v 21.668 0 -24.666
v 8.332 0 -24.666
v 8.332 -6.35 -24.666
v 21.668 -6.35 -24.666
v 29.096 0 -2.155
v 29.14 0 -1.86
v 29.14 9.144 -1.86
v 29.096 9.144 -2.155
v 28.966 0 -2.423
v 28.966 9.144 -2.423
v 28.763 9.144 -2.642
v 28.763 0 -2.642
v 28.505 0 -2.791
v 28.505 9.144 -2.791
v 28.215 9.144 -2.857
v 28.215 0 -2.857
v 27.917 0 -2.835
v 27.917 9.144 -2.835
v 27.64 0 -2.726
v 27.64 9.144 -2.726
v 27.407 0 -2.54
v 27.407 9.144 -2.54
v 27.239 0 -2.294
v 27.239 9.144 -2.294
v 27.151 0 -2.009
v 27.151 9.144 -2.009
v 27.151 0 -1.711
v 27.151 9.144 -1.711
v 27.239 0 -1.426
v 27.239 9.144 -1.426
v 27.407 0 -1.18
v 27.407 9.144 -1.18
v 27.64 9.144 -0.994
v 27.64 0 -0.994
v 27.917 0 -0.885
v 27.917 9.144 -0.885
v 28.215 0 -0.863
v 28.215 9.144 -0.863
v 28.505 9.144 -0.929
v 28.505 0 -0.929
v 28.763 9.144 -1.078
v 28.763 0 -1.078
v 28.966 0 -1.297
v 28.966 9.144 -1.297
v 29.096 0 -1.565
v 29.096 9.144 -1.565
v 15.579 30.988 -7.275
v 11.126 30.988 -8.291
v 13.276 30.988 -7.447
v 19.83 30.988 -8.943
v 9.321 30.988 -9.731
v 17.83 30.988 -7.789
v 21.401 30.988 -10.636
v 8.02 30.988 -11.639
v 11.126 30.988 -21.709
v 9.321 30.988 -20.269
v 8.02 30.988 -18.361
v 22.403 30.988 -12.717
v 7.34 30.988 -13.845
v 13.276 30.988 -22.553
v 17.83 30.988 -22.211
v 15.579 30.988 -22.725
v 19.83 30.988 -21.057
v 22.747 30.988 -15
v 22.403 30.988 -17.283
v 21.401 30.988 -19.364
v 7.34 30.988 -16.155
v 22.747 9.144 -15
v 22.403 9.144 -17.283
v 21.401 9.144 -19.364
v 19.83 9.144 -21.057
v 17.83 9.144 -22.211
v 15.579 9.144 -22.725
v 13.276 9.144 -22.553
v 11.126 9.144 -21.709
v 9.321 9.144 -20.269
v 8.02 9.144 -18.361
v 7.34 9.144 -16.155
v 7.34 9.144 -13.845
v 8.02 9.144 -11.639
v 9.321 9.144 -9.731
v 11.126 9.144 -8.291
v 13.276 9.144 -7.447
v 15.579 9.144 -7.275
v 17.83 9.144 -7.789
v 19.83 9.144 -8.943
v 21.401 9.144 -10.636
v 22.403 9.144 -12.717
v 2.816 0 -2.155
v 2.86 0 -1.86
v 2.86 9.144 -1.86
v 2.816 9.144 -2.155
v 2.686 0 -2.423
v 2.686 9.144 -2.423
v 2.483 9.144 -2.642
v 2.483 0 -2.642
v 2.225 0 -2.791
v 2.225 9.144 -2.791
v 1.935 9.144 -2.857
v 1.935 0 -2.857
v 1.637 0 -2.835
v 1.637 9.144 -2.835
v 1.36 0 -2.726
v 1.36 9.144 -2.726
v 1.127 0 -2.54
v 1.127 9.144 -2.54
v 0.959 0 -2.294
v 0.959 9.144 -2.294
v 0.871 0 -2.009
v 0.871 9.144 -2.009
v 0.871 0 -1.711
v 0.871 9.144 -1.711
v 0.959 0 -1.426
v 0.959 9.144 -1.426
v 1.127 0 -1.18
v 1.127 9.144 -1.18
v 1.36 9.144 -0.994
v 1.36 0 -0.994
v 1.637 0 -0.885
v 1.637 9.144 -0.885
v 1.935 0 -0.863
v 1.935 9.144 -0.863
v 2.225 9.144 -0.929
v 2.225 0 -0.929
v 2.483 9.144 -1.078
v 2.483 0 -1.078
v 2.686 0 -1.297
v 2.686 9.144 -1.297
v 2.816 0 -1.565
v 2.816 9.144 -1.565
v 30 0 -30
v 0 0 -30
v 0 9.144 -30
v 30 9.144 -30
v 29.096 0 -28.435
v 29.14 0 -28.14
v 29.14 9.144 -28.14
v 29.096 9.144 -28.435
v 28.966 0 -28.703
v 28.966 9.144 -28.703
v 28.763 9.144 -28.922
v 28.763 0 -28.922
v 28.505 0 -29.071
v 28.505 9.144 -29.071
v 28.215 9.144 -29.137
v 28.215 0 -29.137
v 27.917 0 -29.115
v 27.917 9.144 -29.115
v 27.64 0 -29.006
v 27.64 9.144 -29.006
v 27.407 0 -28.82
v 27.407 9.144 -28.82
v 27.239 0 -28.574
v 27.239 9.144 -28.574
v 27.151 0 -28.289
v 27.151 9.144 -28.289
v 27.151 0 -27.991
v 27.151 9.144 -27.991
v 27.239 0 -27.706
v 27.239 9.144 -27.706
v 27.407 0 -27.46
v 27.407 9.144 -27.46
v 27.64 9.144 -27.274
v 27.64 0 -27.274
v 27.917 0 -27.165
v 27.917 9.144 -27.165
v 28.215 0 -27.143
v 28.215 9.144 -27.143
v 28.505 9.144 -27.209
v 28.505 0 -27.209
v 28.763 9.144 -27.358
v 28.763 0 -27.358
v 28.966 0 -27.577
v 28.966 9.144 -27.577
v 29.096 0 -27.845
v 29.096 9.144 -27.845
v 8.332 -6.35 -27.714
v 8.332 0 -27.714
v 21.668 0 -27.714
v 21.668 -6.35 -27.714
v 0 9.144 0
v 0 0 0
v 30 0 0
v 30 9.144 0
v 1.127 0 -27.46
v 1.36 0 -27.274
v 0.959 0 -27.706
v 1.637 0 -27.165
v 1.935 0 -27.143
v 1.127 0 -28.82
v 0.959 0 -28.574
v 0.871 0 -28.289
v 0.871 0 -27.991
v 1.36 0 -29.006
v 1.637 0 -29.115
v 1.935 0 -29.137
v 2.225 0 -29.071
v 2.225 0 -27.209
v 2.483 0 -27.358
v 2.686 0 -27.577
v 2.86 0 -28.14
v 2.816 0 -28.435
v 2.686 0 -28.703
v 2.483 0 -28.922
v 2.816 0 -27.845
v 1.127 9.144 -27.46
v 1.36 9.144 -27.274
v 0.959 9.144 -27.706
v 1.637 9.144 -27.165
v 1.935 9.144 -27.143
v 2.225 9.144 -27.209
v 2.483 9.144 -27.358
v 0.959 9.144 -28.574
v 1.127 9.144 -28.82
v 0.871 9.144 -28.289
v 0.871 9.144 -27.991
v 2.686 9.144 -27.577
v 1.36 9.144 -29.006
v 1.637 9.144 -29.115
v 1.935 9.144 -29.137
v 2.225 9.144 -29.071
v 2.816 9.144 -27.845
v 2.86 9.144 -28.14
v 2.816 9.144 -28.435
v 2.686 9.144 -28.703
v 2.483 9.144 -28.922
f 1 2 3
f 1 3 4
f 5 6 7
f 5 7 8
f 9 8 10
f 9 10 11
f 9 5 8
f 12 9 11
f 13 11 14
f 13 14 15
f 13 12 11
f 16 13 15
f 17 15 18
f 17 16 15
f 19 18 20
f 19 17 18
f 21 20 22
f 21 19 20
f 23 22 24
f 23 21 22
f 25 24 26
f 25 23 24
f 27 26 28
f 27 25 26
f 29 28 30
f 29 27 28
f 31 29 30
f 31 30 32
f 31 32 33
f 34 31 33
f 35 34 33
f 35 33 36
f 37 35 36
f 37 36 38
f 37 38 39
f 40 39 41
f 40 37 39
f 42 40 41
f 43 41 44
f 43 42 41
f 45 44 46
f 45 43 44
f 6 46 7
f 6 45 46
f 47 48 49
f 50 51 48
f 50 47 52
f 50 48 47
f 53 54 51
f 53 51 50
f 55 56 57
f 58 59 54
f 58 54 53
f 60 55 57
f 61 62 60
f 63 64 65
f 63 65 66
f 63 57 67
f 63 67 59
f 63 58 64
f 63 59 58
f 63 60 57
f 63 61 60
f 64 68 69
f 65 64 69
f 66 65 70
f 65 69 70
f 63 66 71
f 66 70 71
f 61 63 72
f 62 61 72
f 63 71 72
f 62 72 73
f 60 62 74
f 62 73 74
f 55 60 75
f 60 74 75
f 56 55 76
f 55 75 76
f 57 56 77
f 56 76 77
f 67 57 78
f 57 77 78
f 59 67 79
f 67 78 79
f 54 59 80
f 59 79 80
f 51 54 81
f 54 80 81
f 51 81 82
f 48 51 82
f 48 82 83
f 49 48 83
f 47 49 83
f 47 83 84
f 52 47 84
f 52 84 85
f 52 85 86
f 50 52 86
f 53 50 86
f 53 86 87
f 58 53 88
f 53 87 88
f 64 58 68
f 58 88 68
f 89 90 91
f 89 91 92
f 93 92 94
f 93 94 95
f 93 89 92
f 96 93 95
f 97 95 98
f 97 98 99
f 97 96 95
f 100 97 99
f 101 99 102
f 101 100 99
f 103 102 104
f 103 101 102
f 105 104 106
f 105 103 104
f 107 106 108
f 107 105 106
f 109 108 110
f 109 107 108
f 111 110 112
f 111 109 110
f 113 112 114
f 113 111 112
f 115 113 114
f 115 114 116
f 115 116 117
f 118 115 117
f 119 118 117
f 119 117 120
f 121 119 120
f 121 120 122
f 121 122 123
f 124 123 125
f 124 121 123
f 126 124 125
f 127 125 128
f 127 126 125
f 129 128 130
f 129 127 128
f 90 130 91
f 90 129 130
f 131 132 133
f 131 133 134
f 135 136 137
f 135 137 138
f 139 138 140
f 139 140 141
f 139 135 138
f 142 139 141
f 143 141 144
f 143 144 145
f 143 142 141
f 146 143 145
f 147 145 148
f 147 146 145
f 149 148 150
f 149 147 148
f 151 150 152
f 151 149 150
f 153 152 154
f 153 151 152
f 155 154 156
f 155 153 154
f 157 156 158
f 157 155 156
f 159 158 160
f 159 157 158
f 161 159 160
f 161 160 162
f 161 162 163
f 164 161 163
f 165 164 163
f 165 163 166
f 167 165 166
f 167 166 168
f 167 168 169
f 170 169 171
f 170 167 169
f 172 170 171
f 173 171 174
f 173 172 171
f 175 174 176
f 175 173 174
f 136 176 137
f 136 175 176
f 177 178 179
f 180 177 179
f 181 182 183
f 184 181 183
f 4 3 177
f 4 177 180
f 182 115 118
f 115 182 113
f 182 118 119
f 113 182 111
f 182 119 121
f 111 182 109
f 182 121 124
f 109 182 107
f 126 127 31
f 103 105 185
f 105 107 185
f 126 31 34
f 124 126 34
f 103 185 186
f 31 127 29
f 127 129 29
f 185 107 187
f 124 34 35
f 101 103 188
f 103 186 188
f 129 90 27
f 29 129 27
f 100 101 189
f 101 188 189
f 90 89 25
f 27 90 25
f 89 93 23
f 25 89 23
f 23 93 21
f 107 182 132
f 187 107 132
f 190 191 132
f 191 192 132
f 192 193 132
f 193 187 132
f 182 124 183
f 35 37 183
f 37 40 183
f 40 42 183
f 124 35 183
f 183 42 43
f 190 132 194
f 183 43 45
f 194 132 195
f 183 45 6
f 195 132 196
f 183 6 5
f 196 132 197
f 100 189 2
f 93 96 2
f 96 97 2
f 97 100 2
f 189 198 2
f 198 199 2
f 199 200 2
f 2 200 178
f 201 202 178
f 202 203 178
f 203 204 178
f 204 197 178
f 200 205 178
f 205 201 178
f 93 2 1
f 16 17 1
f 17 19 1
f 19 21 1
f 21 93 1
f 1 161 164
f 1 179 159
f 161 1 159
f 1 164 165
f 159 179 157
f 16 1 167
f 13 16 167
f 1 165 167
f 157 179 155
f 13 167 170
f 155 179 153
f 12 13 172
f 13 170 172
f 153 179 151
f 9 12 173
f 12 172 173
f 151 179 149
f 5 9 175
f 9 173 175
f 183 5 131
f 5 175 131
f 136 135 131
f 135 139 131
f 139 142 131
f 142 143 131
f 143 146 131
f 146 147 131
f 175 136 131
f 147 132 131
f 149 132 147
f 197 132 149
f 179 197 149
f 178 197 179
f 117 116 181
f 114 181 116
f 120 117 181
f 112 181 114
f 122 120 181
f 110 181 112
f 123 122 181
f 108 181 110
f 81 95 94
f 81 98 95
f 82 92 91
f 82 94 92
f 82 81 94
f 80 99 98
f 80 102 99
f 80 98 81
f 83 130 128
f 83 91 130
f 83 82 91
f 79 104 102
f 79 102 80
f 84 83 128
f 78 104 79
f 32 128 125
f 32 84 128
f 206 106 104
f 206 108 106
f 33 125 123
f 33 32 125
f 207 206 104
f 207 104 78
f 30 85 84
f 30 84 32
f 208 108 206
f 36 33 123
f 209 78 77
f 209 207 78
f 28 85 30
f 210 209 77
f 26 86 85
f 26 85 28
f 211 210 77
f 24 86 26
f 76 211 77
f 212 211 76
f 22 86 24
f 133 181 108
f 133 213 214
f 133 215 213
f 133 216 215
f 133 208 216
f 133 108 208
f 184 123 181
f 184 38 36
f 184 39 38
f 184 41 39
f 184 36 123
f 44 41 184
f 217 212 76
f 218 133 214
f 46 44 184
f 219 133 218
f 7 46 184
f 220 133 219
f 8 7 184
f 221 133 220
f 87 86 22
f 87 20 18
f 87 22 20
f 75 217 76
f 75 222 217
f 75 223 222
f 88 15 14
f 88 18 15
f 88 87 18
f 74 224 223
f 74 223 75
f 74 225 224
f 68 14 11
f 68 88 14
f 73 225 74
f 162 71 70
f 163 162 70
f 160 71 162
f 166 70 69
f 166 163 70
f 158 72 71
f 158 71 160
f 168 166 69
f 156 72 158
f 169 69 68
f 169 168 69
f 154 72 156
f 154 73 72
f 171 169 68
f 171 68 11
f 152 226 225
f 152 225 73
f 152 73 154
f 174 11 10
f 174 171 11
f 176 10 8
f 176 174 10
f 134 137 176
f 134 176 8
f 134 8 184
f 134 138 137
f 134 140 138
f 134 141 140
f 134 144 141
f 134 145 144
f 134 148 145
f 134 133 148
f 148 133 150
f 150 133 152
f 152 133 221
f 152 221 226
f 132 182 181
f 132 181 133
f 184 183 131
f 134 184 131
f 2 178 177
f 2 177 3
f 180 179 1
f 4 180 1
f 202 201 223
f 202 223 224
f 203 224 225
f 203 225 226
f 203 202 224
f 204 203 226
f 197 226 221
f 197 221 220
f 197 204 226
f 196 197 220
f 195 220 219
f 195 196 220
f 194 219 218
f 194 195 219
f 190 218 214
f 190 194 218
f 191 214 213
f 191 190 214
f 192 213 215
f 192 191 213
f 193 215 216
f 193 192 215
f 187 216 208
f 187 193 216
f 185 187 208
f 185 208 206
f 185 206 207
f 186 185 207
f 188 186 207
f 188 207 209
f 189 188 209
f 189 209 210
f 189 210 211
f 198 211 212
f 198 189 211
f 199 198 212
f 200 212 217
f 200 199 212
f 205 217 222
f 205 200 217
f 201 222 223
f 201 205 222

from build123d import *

# Parameters (mm, degrees)
SKETCH1_W           = 30
SKETCH1_H           = 30
SKETCH1_R           = 1
BOSS_EXTRUDE1_DEPTH = 9.144
SKETCH2_R           = 7.747
BOSS_EXTRUDE2_DEPTH = 21.844
SKETCH3_W           = 13.335
SKETCH3_H           = 3.048
BOSS_EXTRUDE3_DEPTH = 6.35


with BuildPart() as part:
    # Sketch1 → Boss-Extrude1 (new body)
    with BuildSketch(Plane(origin=(0, 0, 0), x_dir=(1, 0, 0), z_dir=(0, 1, 0))):
        with Locations((15, 15)):
            Rectangle(SKETCH1_W, SKETCH1_H)
        with Locations((28.14, 1.86)):
            Circle(SKETCH1_R, mode=Mode.SUBTRACT)
        with Locations((28.14, 28.1400088)):
            Circle(SKETCH1_R, mode=Mode.SUBTRACT)
        with Locations((1.86, 28.1400088)):
            Circle(SKETCH1_R, mode=Mode.SUBTRACT)
        with Locations((1.86, 1.86)):
            Circle(SKETCH1_R, mode=Mode.SUBTRACT)
    extrude(amount=BOSS_EXTRUDE1_DEPTH)

    # Sketch2 → Boss-Extrude2 (add)
    with BuildSketch(Plane(origin=(0, 9.144, 0), x_dir=(1, 0, 0), z_dir=(0, 1, 0))):
        with Locations((15, 15)):
            Circle(SKETCH2_R)
    extrude(amount=BOSS_EXTRUDE2_DEPTH)

    # Sketch3 → Boss-Extrude3 (add)
    with BuildSketch(Plane.XZ):
        with Locations((15, -26.19)):
            Rectangle(SKETCH3_W, SKETCH3_H)
    extrude(amount=BOSS_EXTRUDE3_DEPTH)


solid = part.part
